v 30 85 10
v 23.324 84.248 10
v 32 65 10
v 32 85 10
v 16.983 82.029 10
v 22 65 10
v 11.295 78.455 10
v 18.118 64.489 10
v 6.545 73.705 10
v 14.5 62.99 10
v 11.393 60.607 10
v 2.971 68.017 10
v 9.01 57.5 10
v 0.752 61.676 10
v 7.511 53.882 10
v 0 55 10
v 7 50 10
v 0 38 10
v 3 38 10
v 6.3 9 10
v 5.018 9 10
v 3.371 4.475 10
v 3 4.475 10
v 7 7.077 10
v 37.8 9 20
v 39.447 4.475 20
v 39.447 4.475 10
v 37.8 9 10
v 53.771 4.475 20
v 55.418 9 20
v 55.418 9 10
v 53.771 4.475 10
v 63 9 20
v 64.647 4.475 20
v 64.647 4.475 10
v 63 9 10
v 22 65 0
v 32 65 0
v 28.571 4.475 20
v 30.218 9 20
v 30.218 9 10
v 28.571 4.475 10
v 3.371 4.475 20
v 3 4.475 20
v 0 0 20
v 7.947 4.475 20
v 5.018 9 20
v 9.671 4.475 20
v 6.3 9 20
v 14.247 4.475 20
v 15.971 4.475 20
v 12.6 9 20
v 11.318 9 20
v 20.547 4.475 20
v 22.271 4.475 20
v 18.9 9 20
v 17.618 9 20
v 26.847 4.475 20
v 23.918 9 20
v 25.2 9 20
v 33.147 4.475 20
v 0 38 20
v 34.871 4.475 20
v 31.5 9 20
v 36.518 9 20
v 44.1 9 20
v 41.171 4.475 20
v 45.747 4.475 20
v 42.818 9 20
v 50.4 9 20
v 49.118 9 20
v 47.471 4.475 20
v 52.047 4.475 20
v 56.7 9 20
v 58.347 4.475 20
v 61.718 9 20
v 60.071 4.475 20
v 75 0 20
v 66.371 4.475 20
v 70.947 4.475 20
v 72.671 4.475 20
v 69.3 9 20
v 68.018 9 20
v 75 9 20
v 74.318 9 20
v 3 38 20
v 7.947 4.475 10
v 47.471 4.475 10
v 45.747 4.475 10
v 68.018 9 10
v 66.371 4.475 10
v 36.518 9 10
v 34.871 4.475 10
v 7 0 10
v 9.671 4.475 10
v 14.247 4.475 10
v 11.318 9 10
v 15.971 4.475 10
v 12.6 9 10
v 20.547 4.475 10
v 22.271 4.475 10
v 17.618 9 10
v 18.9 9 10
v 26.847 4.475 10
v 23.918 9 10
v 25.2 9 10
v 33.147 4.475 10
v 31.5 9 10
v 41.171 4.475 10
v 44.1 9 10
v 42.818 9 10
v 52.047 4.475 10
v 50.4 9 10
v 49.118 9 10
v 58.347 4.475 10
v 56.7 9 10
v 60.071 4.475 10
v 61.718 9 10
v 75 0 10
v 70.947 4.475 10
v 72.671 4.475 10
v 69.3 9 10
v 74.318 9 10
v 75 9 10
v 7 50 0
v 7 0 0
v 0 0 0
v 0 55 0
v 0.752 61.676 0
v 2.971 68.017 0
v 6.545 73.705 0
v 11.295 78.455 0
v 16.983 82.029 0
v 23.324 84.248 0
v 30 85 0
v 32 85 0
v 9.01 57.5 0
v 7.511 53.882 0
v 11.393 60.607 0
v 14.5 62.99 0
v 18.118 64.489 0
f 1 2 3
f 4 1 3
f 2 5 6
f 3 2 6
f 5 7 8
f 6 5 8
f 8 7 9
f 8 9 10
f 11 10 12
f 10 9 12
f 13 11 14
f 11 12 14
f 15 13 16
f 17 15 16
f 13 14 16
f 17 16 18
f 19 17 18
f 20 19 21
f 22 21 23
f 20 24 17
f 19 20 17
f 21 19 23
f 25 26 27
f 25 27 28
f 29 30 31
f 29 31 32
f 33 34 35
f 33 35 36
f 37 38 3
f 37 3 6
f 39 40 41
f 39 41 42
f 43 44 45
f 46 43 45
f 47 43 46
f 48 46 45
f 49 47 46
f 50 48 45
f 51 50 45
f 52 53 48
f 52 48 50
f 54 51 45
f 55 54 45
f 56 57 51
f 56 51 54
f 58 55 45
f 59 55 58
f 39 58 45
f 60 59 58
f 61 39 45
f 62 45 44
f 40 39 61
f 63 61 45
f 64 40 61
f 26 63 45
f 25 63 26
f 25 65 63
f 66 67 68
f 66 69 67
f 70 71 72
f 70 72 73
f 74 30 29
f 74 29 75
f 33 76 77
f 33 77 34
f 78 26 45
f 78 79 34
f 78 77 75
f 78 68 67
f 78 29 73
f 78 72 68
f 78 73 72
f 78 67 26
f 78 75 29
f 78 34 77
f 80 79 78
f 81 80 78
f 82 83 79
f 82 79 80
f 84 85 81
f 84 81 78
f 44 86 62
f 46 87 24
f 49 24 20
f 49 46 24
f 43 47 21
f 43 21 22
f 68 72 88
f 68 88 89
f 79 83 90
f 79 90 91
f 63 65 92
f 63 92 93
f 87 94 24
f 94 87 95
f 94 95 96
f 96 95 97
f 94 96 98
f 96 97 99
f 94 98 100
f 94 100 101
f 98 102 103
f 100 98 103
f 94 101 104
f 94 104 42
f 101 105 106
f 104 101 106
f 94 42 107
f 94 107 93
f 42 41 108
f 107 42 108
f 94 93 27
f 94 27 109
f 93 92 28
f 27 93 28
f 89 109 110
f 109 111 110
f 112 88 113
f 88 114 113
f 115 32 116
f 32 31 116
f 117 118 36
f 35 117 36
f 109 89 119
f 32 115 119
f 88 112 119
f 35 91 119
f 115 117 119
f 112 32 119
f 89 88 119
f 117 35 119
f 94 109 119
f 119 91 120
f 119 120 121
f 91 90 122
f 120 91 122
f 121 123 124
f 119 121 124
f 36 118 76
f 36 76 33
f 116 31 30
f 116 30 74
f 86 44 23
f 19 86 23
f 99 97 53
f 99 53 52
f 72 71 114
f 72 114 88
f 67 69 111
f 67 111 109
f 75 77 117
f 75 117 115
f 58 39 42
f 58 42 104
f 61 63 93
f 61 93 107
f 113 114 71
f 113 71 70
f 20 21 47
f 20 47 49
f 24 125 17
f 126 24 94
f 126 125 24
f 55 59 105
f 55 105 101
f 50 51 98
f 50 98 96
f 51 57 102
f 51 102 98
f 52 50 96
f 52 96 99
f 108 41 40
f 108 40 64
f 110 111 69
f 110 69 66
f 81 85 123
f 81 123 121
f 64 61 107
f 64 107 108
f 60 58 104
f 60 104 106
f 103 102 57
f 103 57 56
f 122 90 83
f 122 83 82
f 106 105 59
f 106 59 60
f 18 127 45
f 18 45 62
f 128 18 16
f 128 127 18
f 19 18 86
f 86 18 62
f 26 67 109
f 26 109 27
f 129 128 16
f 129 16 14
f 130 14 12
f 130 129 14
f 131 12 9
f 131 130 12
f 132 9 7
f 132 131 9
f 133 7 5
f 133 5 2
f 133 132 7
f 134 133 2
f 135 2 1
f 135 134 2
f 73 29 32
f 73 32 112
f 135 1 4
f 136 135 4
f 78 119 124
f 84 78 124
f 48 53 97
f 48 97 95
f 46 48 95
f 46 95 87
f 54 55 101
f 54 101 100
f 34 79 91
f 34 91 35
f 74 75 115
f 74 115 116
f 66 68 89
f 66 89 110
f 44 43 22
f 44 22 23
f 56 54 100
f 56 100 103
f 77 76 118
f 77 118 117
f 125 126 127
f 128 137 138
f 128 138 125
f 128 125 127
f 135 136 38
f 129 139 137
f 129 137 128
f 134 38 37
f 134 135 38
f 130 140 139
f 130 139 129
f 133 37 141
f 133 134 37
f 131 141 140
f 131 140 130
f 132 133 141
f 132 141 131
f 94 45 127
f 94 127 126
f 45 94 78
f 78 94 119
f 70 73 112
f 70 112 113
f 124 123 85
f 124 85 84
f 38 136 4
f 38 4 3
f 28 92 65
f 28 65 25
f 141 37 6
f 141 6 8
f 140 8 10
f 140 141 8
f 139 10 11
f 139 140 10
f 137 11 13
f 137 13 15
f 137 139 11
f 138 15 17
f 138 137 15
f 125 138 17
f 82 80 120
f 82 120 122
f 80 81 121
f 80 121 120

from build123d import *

# Parameters (mm, degrees)
BOSS_EXTRUDE1_DEPTH             = 10
SKIZZE2_W                       = 75
SKIZZE2_H                       = 9
AUFSATZ_LINEAR_AUSTRAGEN1_DEPTH = 10
SCHNITT_LINEAR_AUSTRAGEN2_DEPTH = 10
AUFSATZ_LINEAR_AUSTRAGEN2_DEPTH = 3


with BuildPart() as part:
    # Sketch1 → Boss-Extrude1 (new body)
    with BuildSketch(Plane.XY):
        with BuildLine():
            Line((7, 0), (0, 0))
            Line((0, 0), (0, 47.7))
            Line((0, 47.7), (0, 55))
            ThreePointArc((0, 55), (8.786796564, 76.213203436), (30, 85))
            Line((30, 85), (32, 85))
            Line((32, 85), (32, 65))
            Line((32, 65), (22, 65))
            ThreePointArc((22, 65), (11.393398282, 60.606601718), (7, 50))
            Line((7, 50), (7, 0))
        make_face()
    extrude(amount=BOSS_EXTRUDE1_DEPTH)

    # Skizze2 → Aufsatz-Linear austragen1 (add)
    with BuildSketch(Plane.XY.offset(10)):
        with Locations((37.5, 4.5)):
            Rectangle(SKIZZE2_W, SKIZZE2_H)
    extrude(amount=AUFSATZ_LINEAR_AUSTRAGEN1_DEPTH)

    # Skizze3 → Schnitt-Linear austragen2 (cut)
    with BuildSketch(Plane.XY.offset(20)):
        Polygon((3.370852377, 4.4746), (1.647110898, 4.4746), (0, 9), (5.017963275, 9), align=None)
        Polygon((9.670852377, 4.4746), (7.947110898, 4.4746), (6.3, 9), (11.317963275, 9), align=None)
        Polygon((15.970852377, 4.4746), (14.247110898, 4.4746), (12.6, 9), (17.617963275, 9), align=None)
        Polygon((22.270852377, 4.4746), (20.547110898, 4.4746), (18.9, 9), (23.917963275, 9), align=None)
        Polygon((28.570852377, 4.4746), (26.847110898, 4.4746), (25.2, 9), (30.217963275, 9), align=None)
        Polygon((34.870852377, 4.4746), (33.147110898, 4.4746), (31.5, 9), (36.517963275, 9), align=None)
        Polygon((41.170852377, 4.4746), (39.447110898, 4.4746), (37.8, 9), (42.817963275, 9), align=None)
        Polygon((47.470852377, 4.4746), (45.747110898, 4.4746), (44.1, 9), (49.117963275, 9), align=None)
        Polygon((53.770852377, 4.4746), (52.047110898, 4.4746), (50.4, 9), (55.417963275, 9), align=None)
        Polygon((60.070852377, 4.4746), (58.347110898, 4.4746), (56.7, 9), (61.717963275, 9), align=None)
        Polygon((66.370852377, 4.4746), (64.647110898, 4.4746), (63, 9), (68.017963275, 9), align=None)
        Polygon((72.670852377, 4.4746), (70.947110898, 4.4746), (69.3, 9), (74.317963275, 9), align=None)
    extrude(amount=-SCHNITT_LINEAR_AUSTRAGEN2_DEPTH, mode=Mode.SUBTRACT)

    # Skizze4 → Aufsatz-Linear austragen2 (add)
    with BuildSketch(Plane.ZY):
        Polygon((20, 0), (0, 0), (0, 48), (10, 48), (10, 38), (20, 38), align=None)
    extrude(amount=-AUFSATZ_LINEAR_AUSTRAGEN2_DEPTH)


solid = part.part
